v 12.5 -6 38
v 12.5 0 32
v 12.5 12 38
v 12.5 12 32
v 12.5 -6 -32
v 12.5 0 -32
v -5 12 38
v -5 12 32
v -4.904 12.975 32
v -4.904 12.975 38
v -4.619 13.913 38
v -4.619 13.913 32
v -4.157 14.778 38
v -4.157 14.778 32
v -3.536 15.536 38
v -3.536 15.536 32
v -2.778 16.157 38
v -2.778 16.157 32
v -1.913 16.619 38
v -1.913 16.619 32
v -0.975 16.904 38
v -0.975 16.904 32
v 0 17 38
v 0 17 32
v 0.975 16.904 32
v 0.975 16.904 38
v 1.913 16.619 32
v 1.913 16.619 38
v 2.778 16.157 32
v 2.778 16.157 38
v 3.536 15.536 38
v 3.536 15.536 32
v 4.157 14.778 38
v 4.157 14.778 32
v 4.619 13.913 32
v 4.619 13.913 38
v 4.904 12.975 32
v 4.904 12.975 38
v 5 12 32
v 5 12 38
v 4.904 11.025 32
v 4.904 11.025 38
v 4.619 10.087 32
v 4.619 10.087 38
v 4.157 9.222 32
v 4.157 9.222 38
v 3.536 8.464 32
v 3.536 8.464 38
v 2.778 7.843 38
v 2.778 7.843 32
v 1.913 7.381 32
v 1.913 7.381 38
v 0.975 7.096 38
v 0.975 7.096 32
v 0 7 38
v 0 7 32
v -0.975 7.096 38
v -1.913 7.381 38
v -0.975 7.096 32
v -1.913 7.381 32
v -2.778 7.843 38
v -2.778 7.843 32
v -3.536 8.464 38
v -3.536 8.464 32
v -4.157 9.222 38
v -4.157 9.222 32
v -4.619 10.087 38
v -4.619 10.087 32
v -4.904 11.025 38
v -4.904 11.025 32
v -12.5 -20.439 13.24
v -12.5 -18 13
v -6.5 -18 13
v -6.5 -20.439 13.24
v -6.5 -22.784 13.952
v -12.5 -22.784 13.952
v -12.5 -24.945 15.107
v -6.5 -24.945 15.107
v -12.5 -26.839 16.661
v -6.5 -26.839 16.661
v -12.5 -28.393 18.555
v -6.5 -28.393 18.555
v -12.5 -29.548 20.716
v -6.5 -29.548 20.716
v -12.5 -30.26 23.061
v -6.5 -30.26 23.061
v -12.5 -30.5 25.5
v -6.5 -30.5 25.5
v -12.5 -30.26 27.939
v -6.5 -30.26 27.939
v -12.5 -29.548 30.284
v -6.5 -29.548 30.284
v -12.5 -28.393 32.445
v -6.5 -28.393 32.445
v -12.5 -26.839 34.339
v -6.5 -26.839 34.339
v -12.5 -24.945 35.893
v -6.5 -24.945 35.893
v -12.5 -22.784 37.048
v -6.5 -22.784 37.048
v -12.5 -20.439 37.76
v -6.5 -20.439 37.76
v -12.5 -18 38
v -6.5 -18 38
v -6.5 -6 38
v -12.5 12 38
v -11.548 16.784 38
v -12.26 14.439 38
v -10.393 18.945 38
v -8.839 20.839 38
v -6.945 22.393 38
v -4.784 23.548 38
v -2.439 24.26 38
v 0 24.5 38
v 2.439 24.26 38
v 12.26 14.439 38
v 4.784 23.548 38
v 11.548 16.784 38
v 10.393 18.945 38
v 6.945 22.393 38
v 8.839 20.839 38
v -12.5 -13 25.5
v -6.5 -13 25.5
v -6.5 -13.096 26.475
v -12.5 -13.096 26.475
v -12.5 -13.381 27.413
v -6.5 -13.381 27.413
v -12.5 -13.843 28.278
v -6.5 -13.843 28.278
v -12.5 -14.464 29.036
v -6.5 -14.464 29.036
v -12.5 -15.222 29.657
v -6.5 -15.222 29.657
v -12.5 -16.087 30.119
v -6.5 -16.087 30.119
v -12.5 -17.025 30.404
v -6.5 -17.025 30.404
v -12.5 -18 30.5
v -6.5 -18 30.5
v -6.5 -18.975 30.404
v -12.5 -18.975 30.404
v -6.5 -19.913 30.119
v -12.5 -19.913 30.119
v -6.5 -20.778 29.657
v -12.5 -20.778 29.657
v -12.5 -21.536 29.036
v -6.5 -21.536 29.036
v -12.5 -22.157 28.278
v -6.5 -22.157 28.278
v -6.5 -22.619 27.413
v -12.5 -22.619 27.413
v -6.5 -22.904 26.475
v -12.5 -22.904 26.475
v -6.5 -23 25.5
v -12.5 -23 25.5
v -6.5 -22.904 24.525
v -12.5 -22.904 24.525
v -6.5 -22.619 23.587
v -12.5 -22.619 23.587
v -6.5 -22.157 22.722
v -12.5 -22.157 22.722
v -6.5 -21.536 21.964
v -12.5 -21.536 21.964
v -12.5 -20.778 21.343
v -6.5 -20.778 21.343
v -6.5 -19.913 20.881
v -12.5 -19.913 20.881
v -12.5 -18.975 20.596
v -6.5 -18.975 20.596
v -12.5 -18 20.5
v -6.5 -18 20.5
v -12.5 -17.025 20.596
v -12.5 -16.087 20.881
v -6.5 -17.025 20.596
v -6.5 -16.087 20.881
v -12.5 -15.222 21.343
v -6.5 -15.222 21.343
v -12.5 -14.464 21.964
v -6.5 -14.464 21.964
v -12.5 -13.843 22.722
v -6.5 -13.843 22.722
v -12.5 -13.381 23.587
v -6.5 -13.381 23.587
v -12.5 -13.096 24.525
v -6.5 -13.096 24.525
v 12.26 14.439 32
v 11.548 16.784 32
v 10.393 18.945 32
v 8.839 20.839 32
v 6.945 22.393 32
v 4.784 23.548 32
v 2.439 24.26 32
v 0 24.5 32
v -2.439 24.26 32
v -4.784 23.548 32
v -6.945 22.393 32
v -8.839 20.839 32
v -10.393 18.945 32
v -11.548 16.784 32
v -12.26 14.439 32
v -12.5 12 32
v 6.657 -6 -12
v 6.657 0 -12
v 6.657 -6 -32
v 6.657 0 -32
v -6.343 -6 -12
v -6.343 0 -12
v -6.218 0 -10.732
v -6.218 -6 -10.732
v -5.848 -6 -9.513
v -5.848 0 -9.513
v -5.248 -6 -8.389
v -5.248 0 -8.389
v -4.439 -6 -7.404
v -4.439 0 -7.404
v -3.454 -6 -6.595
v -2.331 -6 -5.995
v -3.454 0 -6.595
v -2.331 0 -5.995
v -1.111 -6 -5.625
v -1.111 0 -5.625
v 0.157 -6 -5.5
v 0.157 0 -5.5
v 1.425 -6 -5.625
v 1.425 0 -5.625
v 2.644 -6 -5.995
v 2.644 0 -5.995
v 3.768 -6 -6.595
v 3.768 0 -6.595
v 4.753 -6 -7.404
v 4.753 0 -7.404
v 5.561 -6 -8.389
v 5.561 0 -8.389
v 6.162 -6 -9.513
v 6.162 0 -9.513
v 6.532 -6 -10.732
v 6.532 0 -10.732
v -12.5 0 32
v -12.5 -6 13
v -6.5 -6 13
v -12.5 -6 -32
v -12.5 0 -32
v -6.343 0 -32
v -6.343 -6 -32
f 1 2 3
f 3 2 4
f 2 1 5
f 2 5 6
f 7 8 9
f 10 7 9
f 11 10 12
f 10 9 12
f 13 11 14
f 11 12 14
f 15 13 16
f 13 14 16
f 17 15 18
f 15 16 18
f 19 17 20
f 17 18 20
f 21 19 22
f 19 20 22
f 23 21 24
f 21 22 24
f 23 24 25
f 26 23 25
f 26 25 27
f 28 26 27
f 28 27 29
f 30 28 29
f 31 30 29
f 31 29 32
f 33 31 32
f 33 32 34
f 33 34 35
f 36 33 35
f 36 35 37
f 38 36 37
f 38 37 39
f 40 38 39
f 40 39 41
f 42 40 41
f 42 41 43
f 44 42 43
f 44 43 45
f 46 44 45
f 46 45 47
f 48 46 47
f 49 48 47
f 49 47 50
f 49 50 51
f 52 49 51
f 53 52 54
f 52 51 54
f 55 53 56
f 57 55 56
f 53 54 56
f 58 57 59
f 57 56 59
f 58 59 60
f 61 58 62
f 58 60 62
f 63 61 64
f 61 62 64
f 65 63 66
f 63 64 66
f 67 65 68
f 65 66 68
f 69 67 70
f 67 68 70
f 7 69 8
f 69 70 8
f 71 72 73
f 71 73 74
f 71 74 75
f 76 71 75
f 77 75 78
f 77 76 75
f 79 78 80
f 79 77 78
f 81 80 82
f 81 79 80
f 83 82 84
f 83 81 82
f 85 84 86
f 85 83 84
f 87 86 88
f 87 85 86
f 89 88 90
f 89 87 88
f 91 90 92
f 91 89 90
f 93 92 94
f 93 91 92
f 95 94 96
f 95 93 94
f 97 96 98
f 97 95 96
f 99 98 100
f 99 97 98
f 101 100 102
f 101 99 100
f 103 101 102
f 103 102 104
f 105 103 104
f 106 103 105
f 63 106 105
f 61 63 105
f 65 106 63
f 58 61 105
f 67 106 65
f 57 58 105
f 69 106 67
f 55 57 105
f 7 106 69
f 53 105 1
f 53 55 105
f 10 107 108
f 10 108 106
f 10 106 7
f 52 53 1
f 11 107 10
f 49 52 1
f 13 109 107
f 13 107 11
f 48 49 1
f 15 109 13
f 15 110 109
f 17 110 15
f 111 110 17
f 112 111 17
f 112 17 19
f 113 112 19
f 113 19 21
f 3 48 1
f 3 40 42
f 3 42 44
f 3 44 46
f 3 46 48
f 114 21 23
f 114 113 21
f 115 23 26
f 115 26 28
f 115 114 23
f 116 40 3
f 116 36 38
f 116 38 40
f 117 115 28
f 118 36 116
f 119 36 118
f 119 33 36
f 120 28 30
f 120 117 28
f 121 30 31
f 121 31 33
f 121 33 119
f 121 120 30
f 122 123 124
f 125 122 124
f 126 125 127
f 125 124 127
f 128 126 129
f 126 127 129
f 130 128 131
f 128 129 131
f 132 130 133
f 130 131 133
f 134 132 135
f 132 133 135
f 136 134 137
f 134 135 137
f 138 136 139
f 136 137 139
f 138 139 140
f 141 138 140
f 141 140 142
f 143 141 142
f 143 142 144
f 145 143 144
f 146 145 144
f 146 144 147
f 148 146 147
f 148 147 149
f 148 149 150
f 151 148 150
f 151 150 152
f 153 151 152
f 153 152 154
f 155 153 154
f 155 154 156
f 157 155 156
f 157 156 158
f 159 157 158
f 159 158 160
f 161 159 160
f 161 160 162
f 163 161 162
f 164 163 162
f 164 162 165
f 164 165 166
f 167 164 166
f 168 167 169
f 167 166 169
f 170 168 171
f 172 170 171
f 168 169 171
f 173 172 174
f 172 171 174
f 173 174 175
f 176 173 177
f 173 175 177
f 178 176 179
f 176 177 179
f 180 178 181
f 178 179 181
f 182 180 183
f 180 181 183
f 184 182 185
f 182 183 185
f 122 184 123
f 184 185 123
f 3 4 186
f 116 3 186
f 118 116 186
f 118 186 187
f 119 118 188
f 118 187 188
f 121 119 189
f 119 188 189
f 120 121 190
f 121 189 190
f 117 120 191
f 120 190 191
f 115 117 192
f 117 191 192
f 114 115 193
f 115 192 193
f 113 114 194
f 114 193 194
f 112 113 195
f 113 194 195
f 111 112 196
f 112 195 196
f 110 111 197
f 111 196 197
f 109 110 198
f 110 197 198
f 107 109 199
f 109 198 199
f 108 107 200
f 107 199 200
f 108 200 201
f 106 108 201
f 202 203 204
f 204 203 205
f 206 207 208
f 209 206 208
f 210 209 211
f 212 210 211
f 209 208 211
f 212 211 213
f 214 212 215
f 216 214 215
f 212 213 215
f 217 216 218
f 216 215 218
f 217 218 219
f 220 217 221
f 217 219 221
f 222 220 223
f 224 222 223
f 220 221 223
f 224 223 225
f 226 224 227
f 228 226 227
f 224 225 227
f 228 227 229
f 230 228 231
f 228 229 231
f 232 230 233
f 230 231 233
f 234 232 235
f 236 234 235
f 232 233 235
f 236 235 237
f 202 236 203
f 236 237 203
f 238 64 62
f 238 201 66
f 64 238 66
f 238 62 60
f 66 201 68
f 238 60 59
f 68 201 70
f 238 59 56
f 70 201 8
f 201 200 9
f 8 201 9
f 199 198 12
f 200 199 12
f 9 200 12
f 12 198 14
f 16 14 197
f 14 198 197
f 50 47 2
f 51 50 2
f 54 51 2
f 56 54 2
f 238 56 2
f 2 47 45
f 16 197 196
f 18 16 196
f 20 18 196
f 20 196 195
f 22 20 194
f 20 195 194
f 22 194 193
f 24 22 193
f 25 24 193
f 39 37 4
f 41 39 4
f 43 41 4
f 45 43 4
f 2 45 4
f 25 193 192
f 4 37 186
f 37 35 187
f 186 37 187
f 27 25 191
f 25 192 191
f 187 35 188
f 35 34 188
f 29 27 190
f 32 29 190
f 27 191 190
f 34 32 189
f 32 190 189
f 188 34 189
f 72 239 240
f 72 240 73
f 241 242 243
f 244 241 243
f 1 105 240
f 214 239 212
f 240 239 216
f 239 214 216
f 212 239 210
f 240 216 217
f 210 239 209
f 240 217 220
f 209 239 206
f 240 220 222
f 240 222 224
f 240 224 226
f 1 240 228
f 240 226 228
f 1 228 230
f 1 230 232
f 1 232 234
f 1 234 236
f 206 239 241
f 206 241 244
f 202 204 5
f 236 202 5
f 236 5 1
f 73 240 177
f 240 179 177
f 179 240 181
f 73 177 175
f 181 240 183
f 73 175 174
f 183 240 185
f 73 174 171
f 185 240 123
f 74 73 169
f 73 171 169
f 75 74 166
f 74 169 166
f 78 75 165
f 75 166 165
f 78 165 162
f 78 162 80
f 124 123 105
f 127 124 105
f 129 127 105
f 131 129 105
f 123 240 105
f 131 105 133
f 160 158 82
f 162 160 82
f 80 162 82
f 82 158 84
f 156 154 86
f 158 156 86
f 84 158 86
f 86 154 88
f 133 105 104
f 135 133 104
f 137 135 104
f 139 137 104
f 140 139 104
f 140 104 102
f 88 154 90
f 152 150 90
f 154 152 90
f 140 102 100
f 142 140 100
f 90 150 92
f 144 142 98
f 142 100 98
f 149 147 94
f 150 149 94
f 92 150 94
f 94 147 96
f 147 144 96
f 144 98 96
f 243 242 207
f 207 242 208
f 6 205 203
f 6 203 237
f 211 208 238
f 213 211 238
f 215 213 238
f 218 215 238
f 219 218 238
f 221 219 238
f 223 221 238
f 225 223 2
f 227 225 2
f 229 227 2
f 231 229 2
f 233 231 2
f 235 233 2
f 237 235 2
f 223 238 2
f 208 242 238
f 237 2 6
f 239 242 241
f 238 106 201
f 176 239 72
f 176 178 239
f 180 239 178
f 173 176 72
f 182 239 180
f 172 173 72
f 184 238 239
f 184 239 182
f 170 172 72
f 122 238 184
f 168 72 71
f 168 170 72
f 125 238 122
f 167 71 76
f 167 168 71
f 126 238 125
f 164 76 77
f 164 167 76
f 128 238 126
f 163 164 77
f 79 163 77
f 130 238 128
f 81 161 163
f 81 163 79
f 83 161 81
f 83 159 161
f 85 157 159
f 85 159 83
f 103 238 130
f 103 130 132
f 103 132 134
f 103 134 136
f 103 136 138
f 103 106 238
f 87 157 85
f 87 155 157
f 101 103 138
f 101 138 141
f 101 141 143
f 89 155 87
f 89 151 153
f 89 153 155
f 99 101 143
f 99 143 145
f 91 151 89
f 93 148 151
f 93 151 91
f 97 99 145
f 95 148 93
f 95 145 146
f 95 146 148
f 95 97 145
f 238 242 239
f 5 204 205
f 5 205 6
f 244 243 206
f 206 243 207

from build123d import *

# Parameters (mm, degrees)
F0_W      = 25
F0_H      = 64
F1_DEPTH  = 6
F2_W      = 25
F2_H      = 6
F3_DEPTH  = 6
F5_DEPTH  = 6
F7_D      = 10
F7_DEPTH  = 13
F7_TIP    = 3.0043030951
F9_D      = 10
F9_DEPTH  = 13
F9_TIP    = 3.0043030951
F11_DEPTH = 12.4


with BuildPart() as f1:
    # F0 (on Front) → F1 (new body)
    with BuildSketch(Plane.XZ):
        Rectangle(F0_W, F0_H)
    extrude(amount=F1_DEPTH)

    # F2 (on face) → F3 (join)
    with BuildSketch(Plane.XY.offset(32)):
        with BuildLine():
            Line((-12.5, 12), (-12.5, 0))
            Line((-12.5, 0), (12.5, 0))
            Line((12.5, 0), (12.5, 12))
            ThreePointArc((12.5, 12), (0, 24.5), (-12.5, 12))
        make_face()
        with Locations((0, -3)):
            Rectangle(F2_W, F2_H)
    extrude(amount=F3_DEPTH)

    # F4 (on face) → F5 (join)
    with BuildSketch(Plane(origin=(-12.5, 0, 0), x_dir=(0, -1, 0), z_dir=(-1, 0, 0))):
        with BuildLine():
            Line((6, 38), (6, 13))
            Line((6, 13), (18, 13))
            ThreePointArc((18, 13), (30.5, 25.5), (18, 38))
            Line((18, 38), (6, 38))
        make_face()
    extrude(amount=-F5_DEPTH)

    # F7
    with Locations(Plane.XY.offset(38)):
        with Locations((0, 12)):
            Hole(F7_D / 2, depth=F7_DEPTH)
            with Locations((0, 0, -(F7_DEPTH + F7_TIP / 2))):  # 118° drill point
                Cone(0, F7_D / 2, F7_TIP, mode=Mode.SUBTRACT)

    # F9
    with Locations(Plane(origin=(-12.5, 0, 0), x_dir=(0, -1, 0), z_dir=(-1, 0, 0))):
        with Locations((18, 25.5)):
            Hole(F9_D / 2, depth=F9_DEPTH)
            with Locations((0, 0, -(F9_DEPTH + F9_TIP / 2))):  # 118° drill point
                Cone(0, F9_D / 2, F9_TIP, mode=Mode.SUBTRACT)

    # F10 (on face) → F11 (cut)
    with BuildSketch(Plane(origin=(0, 0, 0), x_dir=(-1, 0, 0), z_dir=(0, 1, 0))):
        with BuildLine():
            Line((-6.6569247283, -12), (-6.6569247283, -32))
            Line((-6.6569247283, -32), (6.3430752717, -32))
            Line((6.3430752717, -32), (6.3430752717, -12))
            ThreePointArc((6.3430752717, -12), (-0.1569247283, -5.5), (-6.6569247283, -12))
        make_face()
    extrude(amount=-F11_DEPTH, mode=Mode.SUBTRACT)


solid = f1.part
